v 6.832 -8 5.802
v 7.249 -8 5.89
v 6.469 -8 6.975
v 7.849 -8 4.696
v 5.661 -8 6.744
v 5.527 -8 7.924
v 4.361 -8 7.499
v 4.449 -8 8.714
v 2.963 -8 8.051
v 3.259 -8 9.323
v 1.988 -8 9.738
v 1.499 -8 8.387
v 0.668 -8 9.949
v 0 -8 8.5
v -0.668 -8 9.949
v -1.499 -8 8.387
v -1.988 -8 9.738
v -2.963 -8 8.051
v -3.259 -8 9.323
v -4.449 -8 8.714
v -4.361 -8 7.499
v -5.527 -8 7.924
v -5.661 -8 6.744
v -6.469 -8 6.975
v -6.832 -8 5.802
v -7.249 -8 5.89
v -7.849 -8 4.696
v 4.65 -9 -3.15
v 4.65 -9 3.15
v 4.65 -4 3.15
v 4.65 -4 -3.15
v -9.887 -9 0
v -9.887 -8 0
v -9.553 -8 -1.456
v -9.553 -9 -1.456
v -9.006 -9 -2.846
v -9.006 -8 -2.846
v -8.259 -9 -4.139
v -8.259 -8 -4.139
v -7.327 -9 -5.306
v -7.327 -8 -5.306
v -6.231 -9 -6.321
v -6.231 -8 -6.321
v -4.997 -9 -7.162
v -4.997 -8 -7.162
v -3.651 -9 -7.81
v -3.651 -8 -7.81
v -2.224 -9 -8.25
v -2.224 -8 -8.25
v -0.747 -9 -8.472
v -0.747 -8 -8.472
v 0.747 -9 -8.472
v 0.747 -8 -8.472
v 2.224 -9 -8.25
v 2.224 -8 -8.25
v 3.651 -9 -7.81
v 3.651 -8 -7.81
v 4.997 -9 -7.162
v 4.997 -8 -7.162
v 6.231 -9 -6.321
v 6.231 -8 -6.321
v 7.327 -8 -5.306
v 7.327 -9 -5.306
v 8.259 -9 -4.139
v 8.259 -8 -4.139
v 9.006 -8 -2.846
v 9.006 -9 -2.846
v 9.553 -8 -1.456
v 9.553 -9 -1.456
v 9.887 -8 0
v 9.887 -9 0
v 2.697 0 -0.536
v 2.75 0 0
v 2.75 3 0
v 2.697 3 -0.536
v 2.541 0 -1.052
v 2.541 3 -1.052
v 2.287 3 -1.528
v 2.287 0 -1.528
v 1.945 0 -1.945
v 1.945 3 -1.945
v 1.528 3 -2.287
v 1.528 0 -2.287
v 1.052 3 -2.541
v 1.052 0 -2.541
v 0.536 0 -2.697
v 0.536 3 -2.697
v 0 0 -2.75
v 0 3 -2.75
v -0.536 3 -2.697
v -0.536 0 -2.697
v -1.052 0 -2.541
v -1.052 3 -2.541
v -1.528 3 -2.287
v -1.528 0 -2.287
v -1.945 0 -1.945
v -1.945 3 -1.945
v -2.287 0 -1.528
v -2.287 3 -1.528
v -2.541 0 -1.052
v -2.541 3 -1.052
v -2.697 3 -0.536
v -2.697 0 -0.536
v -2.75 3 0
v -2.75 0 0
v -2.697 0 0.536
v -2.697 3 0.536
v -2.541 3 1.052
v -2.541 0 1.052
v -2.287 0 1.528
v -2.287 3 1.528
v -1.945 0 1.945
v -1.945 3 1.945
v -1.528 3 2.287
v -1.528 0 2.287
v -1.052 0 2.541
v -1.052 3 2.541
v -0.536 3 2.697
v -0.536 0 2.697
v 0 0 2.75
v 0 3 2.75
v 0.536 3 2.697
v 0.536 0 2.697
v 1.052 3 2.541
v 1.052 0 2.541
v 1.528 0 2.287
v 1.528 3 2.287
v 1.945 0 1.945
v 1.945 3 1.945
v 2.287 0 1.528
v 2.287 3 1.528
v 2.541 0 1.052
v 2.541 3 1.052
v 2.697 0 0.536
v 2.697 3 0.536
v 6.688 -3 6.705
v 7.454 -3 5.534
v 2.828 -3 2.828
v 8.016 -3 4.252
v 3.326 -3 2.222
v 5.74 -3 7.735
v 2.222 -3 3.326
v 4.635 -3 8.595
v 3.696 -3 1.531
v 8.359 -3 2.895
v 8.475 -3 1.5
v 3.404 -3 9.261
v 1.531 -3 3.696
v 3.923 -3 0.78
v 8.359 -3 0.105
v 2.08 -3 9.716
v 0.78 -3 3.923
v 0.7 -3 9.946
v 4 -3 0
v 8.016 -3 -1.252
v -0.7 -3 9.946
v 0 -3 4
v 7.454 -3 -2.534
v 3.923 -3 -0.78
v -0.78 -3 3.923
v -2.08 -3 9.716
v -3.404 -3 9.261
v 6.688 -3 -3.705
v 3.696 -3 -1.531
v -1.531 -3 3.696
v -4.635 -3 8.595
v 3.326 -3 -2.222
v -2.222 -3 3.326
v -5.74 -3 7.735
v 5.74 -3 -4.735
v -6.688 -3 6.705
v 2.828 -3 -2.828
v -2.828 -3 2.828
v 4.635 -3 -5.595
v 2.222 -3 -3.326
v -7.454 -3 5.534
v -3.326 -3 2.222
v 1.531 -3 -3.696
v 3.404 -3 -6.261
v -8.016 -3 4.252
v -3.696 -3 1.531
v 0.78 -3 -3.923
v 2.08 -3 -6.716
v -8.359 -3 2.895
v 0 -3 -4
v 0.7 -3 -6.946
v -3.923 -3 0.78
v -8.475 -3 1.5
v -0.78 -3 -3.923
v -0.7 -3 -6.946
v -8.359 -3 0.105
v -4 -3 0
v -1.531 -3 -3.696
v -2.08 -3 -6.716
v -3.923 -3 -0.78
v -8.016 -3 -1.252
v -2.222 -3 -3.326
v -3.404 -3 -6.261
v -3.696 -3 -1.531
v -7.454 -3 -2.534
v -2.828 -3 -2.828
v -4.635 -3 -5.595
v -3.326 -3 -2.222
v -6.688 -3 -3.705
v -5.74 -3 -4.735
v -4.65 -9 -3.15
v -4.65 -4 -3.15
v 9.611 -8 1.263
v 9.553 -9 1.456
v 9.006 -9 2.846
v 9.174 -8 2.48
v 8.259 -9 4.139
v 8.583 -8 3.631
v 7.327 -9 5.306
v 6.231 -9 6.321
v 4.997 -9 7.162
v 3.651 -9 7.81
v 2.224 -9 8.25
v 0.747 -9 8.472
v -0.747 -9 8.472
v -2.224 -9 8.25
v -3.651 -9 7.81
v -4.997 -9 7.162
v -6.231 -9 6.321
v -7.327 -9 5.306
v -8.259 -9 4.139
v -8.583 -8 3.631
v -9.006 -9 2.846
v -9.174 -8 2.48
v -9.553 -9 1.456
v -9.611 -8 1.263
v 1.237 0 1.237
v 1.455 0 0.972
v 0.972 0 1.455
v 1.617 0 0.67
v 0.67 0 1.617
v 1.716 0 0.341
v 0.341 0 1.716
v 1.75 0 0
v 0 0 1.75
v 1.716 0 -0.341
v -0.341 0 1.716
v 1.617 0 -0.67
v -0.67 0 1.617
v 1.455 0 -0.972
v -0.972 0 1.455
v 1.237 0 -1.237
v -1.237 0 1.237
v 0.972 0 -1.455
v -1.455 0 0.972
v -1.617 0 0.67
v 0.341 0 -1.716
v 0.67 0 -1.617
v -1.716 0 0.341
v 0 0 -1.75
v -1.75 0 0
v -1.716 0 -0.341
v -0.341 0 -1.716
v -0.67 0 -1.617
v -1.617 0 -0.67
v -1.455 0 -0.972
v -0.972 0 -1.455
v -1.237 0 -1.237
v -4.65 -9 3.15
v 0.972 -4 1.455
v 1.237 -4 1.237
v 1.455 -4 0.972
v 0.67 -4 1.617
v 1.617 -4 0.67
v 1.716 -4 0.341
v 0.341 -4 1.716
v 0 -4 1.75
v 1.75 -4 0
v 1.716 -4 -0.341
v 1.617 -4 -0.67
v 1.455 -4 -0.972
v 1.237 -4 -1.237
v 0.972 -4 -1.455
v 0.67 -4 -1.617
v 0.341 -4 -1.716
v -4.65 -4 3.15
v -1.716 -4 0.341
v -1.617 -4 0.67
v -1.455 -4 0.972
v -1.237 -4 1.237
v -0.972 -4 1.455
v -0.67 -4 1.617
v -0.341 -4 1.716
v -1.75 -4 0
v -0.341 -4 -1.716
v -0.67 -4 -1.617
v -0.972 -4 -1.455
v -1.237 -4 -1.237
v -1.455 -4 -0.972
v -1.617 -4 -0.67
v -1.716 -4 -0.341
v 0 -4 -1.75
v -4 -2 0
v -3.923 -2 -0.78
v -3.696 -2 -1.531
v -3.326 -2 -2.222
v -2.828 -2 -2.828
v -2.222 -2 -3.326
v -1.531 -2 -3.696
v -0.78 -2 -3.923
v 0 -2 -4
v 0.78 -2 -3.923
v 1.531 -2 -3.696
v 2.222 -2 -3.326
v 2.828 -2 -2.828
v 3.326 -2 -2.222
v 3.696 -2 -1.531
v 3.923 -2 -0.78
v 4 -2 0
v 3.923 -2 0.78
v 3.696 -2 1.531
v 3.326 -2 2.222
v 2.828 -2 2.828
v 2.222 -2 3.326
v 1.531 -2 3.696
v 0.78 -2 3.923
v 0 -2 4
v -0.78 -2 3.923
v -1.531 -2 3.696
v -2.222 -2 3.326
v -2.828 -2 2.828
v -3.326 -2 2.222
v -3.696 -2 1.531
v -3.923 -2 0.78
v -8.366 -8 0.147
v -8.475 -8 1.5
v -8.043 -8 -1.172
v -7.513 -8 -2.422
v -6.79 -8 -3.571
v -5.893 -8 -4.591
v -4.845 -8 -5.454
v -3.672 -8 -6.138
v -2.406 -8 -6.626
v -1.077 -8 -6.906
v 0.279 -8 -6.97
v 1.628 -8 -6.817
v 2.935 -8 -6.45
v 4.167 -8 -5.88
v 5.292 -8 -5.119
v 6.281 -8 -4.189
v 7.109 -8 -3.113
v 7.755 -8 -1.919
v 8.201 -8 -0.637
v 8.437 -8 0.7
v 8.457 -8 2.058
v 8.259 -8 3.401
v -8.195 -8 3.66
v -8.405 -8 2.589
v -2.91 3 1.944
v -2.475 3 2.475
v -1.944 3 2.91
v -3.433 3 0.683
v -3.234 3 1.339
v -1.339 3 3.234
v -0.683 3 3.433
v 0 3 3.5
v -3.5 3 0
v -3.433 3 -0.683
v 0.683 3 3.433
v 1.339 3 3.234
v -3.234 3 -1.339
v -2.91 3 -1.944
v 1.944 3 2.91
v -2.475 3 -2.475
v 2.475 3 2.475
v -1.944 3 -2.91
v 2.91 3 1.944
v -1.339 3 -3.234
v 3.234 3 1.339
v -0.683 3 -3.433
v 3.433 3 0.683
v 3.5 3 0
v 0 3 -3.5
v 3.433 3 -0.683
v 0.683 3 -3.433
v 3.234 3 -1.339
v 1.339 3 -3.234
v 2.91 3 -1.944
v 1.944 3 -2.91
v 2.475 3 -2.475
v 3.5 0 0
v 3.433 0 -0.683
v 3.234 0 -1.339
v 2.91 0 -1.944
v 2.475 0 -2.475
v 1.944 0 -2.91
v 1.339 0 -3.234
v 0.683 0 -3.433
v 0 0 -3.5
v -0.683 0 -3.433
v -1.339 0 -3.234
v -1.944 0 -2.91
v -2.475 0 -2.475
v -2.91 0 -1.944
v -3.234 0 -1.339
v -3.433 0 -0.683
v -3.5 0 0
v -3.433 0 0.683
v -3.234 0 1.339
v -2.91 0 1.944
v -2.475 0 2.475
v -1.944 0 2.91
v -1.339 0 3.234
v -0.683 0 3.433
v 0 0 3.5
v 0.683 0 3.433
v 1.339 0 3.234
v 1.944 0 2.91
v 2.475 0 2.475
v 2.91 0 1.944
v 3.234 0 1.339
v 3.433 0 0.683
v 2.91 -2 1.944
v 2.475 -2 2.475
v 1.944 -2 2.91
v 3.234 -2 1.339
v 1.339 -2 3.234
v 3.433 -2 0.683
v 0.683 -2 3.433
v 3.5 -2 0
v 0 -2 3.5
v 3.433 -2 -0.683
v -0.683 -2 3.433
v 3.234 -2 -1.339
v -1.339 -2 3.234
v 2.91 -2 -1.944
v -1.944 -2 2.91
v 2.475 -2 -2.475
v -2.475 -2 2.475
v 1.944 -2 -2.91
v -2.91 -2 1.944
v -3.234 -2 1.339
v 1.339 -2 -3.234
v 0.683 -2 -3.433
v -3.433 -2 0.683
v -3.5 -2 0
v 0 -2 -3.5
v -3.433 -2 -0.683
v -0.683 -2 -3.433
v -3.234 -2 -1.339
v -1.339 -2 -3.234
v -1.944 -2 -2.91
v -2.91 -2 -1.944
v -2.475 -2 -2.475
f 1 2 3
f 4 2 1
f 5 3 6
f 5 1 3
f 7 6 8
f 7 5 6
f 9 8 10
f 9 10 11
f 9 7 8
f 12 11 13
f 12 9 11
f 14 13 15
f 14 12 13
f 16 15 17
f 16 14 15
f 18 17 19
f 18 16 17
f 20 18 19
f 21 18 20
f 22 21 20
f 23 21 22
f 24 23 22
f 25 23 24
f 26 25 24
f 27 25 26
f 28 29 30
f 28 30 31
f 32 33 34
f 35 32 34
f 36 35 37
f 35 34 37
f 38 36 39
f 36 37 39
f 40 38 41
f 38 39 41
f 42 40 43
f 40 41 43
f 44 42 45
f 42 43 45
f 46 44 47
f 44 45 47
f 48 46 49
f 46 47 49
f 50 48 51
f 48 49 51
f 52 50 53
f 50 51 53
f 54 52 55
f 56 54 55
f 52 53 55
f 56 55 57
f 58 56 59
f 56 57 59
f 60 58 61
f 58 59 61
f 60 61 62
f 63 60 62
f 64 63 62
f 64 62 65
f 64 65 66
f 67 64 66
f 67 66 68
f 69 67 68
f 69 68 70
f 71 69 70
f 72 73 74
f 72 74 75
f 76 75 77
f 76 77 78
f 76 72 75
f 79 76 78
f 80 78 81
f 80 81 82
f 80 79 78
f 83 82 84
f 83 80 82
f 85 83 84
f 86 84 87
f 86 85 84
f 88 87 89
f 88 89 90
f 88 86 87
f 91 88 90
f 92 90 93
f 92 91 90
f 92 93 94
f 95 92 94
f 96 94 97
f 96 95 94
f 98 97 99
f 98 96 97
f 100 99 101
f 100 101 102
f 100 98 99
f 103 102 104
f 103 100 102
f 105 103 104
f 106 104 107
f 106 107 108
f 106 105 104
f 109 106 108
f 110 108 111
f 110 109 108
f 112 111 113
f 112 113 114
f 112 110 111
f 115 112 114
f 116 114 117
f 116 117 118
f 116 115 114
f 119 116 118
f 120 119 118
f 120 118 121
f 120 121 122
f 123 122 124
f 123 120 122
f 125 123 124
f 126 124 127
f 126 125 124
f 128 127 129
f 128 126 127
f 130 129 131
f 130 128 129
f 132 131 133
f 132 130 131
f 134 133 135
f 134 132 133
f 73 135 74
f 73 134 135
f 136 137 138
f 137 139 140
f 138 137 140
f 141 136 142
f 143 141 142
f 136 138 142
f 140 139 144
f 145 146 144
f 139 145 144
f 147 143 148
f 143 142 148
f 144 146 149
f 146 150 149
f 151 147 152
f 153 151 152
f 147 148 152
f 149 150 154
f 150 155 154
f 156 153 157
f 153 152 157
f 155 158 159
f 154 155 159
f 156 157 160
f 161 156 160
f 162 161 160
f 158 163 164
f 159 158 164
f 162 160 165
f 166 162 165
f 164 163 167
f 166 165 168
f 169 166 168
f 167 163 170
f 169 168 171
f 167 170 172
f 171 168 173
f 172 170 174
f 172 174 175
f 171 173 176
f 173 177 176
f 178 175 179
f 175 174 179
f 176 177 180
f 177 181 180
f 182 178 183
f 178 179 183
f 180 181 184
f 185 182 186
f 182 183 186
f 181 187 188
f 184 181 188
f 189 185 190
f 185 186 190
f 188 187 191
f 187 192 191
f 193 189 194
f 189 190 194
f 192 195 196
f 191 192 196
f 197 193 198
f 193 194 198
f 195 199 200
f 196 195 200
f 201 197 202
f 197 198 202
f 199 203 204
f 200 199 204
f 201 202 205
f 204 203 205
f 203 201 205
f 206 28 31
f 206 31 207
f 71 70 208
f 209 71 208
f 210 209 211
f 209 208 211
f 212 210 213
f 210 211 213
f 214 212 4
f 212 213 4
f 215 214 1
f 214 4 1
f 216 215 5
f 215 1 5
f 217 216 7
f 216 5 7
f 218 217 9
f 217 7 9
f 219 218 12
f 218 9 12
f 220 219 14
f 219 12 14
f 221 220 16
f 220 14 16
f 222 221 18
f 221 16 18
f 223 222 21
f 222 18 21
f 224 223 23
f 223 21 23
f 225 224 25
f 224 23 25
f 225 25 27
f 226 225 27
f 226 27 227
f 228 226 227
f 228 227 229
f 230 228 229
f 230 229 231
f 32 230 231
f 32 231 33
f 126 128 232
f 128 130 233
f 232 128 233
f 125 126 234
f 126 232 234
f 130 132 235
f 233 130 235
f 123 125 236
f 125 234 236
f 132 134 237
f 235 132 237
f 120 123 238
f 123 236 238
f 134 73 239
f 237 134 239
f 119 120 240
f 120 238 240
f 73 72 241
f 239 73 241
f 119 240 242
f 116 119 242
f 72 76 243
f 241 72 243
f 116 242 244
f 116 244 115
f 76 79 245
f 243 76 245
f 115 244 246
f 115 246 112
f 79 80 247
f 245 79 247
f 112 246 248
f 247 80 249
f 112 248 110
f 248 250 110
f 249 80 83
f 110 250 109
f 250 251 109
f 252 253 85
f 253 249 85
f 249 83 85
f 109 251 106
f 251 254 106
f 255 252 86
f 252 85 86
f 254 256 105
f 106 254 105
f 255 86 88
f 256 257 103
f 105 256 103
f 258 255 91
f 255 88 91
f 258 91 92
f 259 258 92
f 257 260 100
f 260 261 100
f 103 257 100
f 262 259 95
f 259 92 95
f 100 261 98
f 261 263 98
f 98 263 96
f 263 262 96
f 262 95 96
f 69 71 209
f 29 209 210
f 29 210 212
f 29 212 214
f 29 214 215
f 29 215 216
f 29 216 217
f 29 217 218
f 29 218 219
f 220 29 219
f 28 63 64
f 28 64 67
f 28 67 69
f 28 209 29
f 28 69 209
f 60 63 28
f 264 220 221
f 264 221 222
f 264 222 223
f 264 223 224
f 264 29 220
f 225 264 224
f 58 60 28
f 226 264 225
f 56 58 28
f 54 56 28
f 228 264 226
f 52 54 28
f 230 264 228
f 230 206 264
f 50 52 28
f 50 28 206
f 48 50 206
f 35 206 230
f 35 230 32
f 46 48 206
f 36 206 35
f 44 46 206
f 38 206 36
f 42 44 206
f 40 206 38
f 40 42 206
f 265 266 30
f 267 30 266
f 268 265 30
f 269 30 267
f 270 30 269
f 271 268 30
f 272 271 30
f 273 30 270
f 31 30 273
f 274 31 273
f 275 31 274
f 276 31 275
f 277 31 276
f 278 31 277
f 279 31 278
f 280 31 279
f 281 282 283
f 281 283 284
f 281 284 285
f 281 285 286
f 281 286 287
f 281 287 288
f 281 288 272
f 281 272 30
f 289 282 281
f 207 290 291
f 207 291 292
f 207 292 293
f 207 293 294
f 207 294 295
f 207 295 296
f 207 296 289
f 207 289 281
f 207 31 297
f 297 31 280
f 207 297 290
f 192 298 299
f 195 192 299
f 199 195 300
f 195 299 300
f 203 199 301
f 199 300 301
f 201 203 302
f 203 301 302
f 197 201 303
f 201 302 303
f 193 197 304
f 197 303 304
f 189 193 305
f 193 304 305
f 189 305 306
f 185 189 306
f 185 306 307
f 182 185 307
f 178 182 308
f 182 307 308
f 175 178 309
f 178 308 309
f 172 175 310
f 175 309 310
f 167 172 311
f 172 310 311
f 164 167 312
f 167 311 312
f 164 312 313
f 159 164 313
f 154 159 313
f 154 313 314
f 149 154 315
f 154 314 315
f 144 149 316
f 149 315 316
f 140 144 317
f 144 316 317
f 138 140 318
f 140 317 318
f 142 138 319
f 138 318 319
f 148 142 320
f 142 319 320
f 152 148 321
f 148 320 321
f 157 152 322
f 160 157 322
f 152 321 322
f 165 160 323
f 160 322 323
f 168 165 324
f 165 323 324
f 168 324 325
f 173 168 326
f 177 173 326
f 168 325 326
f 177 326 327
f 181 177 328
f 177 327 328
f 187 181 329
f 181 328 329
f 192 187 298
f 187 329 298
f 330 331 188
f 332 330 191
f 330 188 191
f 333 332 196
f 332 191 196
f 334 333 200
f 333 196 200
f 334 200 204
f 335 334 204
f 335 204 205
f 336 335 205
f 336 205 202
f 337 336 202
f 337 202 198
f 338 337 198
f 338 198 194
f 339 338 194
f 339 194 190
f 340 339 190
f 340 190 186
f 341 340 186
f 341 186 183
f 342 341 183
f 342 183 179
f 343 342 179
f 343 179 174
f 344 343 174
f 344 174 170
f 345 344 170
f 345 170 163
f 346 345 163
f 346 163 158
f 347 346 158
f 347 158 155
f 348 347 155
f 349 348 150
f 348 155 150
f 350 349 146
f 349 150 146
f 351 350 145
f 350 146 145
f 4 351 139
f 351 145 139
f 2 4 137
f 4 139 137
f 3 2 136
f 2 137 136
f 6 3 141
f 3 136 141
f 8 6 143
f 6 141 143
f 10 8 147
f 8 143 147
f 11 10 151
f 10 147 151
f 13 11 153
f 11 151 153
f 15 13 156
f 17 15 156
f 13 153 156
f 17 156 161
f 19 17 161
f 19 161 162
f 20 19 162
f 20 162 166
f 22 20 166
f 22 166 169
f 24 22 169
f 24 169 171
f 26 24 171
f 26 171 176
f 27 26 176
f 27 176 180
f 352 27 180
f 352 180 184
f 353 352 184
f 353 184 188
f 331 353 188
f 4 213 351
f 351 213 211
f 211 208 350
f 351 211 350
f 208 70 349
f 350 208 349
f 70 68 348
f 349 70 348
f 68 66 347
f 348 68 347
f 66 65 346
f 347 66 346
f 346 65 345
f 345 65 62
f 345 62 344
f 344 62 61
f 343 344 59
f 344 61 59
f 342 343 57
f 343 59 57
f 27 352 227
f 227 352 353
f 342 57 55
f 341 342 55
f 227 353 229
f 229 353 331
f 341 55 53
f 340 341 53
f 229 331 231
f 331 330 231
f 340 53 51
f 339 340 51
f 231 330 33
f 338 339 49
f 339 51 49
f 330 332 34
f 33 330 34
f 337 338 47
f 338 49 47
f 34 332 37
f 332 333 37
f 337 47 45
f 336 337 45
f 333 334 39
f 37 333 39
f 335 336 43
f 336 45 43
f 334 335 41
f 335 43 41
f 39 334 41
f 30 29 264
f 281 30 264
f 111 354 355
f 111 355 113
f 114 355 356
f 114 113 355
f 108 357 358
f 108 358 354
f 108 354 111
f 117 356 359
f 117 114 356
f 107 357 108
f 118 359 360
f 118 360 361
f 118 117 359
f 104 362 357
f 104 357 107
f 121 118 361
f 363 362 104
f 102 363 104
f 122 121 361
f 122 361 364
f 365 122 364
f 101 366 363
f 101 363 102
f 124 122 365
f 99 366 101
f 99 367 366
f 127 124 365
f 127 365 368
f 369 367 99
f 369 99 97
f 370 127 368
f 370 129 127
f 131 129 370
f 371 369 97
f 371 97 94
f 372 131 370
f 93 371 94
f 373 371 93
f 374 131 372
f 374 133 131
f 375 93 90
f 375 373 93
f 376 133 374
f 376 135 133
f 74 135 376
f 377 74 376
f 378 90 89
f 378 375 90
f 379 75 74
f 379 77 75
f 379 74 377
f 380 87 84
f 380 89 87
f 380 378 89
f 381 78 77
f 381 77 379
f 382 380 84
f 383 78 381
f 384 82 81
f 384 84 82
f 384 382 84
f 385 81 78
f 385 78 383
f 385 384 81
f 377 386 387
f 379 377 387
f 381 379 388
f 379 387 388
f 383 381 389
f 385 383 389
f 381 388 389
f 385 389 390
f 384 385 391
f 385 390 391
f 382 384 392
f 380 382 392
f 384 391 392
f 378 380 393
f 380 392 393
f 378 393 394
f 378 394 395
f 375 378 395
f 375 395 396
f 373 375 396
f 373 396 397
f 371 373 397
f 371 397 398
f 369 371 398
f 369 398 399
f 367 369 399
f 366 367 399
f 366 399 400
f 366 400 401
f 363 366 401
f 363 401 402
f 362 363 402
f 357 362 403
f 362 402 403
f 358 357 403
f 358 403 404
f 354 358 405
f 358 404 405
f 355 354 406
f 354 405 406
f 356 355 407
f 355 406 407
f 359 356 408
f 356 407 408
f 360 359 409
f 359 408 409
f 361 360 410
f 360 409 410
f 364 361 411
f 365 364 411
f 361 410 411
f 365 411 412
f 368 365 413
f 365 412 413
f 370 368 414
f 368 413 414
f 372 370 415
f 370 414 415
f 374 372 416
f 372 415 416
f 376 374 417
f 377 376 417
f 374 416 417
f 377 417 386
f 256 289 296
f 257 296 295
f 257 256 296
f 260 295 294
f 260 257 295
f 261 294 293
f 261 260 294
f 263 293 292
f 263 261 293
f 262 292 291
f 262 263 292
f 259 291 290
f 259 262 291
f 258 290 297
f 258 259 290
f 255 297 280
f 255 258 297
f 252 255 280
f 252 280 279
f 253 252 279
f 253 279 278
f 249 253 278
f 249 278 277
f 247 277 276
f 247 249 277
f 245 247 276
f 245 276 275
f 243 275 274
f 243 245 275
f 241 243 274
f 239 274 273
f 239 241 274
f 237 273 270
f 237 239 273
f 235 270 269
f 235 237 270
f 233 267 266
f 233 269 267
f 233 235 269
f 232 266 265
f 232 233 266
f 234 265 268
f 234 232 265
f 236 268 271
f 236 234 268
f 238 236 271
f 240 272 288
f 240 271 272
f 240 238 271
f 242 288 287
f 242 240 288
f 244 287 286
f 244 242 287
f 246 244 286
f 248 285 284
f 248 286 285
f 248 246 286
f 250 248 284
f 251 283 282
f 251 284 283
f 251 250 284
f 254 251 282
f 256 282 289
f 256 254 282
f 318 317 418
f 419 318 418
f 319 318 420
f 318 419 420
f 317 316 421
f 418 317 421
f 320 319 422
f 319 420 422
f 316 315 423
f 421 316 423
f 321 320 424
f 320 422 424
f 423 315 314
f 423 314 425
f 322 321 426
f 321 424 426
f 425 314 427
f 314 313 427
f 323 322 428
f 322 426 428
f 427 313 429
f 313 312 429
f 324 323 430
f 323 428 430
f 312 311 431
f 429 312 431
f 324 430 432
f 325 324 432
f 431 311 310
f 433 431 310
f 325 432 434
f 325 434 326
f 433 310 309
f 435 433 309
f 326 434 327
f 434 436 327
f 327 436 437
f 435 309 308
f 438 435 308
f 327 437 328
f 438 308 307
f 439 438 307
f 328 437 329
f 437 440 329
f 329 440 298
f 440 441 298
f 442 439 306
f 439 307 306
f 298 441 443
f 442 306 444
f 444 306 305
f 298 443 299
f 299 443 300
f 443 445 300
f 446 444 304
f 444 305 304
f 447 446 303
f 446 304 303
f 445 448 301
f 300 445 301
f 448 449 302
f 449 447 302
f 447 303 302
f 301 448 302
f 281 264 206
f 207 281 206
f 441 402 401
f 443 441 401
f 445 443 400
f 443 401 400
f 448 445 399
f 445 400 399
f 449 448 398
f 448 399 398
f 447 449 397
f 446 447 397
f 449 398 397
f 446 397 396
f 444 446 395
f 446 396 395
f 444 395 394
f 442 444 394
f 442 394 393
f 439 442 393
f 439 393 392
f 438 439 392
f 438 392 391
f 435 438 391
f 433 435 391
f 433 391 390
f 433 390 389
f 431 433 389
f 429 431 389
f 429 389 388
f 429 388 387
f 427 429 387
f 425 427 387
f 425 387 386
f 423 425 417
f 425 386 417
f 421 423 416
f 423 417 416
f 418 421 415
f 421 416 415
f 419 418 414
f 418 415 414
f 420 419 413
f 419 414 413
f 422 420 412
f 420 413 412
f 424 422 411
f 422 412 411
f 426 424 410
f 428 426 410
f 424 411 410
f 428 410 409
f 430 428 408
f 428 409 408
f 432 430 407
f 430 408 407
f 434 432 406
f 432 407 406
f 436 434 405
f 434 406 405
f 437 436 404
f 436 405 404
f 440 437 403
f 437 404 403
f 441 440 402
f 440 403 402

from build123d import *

# Parameters (mm, degrees)
SKETCH1_R           = 3.5
SKETCH1_R_2         = 2.75
BOSS_EXTRUDE1_DEPTH = 3
SKETCH2_R           = 3.5
SKETCH2_R_2         = 1.75
BOSS_EXTRUDE2_DEPTH = 2
SKETCH3_R           = 4
SKETCH3_R_2         = 1.75
BOSS_EXTRUDE3_DEPTH = 1
SKETCH4_R           = 8.475
SKETCH4_R_2         = 1.75
BOSS_EXTRUDE4_DEPTH = 5
SKETCH5_R           = 1.75
BOSS_EXTRUDE5_DEPTH = 1
SKETCH6_W           = 9.3
SKETCH6_H           = 6.3
CUT_EXTRUDE1_DEPTH  = 5


with BuildPart() as part:
    # Sketch1 → Boss-Extrude1 (new body)
    with BuildSketch(Plane(origin=(0, 0, 0), x_dir=(1, 0, 0), z_dir=(0, 1, 0))):
        Circle(SKETCH1_R)
        Circle(SKETCH1_R_2, mode=Mode.SUBTRACT)
    extrude(amount=BOSS_EXTRUDE1_DEPTH)

    # Sketch2 → Boss-Extrude2 (add)
    with BuildSketch(Plane(origin=(0, 0, 0), x_dir=(-1, 0, 0), z_dir=(0, -1, 0))):
        Circle(SKETCH2_R)
        Circle(SKETCH2_R_2, mode=Mode.SUBTRACT)
    extrude(amount=BOSS_EXTRUDE2_DEPTH)

    # Sketch3 → Boss-Extrude3 (add)
    with BuildSketch(Plane(origin=(0, -2, 0), x_dir=(-1, 0, 0), z_dir=(0, -1, 0))):
        Circle(SKETCH3_R)
        Circle(SKETCH3_R_2, mode=Mode.SUBTRACT)
    extrude(amount=BOSS_EXTRUDE3_DEPTH)

    # Sketch4 → Boss-Extrude4 (add)
    with BuildSketch(Plane(origin=(0, -3, 0), x_dir=(-1, 0, 0), z_dir=(0, -1, 0))):
        with Locations((0, -1.5)):
            Circle(SKETCH4_R)
        Circle(SKETCH4_R_2, mode=Mode.SUBTRACT)
    extrude(amount=BOSS_EXTRUDE4_DEPTH)

    # Sketch5 → Boss-Extrude5 (add)
    with BuildSketch(Plane(origin=(0, -8, 0), x_dir=(-1, 0, 0), z_dir=(0, -1, 0))):
        with BuildLine():
            ThreePointArc((-9.886859967, 0), (0, -8.5), (9.886859967, 0))
            ThreePointArc((9.886859967, 0), (0, 8.5), (-9.886859967, 0))
        make_face()
        Circle(SKETCH5_R, mode=Mode.SUBTRACT)
    extrude(amount=BOSS_EXTRUDE5_DEPTH)

    # Sketch6 → Cut-Extrude1 (cut)
    with BuildSketch(Plane(origin=(0, -9, 0), x_dir=(-1, 0, 0), z_dir=(0, -1, 0))):
        Rectangle(SKETCH6_W, SKETCH6_H)
    extrude(amount=-CUT_EXTRUDE1_DEPTH, mode=Mode.SUBTRACT)


solid = part.part
